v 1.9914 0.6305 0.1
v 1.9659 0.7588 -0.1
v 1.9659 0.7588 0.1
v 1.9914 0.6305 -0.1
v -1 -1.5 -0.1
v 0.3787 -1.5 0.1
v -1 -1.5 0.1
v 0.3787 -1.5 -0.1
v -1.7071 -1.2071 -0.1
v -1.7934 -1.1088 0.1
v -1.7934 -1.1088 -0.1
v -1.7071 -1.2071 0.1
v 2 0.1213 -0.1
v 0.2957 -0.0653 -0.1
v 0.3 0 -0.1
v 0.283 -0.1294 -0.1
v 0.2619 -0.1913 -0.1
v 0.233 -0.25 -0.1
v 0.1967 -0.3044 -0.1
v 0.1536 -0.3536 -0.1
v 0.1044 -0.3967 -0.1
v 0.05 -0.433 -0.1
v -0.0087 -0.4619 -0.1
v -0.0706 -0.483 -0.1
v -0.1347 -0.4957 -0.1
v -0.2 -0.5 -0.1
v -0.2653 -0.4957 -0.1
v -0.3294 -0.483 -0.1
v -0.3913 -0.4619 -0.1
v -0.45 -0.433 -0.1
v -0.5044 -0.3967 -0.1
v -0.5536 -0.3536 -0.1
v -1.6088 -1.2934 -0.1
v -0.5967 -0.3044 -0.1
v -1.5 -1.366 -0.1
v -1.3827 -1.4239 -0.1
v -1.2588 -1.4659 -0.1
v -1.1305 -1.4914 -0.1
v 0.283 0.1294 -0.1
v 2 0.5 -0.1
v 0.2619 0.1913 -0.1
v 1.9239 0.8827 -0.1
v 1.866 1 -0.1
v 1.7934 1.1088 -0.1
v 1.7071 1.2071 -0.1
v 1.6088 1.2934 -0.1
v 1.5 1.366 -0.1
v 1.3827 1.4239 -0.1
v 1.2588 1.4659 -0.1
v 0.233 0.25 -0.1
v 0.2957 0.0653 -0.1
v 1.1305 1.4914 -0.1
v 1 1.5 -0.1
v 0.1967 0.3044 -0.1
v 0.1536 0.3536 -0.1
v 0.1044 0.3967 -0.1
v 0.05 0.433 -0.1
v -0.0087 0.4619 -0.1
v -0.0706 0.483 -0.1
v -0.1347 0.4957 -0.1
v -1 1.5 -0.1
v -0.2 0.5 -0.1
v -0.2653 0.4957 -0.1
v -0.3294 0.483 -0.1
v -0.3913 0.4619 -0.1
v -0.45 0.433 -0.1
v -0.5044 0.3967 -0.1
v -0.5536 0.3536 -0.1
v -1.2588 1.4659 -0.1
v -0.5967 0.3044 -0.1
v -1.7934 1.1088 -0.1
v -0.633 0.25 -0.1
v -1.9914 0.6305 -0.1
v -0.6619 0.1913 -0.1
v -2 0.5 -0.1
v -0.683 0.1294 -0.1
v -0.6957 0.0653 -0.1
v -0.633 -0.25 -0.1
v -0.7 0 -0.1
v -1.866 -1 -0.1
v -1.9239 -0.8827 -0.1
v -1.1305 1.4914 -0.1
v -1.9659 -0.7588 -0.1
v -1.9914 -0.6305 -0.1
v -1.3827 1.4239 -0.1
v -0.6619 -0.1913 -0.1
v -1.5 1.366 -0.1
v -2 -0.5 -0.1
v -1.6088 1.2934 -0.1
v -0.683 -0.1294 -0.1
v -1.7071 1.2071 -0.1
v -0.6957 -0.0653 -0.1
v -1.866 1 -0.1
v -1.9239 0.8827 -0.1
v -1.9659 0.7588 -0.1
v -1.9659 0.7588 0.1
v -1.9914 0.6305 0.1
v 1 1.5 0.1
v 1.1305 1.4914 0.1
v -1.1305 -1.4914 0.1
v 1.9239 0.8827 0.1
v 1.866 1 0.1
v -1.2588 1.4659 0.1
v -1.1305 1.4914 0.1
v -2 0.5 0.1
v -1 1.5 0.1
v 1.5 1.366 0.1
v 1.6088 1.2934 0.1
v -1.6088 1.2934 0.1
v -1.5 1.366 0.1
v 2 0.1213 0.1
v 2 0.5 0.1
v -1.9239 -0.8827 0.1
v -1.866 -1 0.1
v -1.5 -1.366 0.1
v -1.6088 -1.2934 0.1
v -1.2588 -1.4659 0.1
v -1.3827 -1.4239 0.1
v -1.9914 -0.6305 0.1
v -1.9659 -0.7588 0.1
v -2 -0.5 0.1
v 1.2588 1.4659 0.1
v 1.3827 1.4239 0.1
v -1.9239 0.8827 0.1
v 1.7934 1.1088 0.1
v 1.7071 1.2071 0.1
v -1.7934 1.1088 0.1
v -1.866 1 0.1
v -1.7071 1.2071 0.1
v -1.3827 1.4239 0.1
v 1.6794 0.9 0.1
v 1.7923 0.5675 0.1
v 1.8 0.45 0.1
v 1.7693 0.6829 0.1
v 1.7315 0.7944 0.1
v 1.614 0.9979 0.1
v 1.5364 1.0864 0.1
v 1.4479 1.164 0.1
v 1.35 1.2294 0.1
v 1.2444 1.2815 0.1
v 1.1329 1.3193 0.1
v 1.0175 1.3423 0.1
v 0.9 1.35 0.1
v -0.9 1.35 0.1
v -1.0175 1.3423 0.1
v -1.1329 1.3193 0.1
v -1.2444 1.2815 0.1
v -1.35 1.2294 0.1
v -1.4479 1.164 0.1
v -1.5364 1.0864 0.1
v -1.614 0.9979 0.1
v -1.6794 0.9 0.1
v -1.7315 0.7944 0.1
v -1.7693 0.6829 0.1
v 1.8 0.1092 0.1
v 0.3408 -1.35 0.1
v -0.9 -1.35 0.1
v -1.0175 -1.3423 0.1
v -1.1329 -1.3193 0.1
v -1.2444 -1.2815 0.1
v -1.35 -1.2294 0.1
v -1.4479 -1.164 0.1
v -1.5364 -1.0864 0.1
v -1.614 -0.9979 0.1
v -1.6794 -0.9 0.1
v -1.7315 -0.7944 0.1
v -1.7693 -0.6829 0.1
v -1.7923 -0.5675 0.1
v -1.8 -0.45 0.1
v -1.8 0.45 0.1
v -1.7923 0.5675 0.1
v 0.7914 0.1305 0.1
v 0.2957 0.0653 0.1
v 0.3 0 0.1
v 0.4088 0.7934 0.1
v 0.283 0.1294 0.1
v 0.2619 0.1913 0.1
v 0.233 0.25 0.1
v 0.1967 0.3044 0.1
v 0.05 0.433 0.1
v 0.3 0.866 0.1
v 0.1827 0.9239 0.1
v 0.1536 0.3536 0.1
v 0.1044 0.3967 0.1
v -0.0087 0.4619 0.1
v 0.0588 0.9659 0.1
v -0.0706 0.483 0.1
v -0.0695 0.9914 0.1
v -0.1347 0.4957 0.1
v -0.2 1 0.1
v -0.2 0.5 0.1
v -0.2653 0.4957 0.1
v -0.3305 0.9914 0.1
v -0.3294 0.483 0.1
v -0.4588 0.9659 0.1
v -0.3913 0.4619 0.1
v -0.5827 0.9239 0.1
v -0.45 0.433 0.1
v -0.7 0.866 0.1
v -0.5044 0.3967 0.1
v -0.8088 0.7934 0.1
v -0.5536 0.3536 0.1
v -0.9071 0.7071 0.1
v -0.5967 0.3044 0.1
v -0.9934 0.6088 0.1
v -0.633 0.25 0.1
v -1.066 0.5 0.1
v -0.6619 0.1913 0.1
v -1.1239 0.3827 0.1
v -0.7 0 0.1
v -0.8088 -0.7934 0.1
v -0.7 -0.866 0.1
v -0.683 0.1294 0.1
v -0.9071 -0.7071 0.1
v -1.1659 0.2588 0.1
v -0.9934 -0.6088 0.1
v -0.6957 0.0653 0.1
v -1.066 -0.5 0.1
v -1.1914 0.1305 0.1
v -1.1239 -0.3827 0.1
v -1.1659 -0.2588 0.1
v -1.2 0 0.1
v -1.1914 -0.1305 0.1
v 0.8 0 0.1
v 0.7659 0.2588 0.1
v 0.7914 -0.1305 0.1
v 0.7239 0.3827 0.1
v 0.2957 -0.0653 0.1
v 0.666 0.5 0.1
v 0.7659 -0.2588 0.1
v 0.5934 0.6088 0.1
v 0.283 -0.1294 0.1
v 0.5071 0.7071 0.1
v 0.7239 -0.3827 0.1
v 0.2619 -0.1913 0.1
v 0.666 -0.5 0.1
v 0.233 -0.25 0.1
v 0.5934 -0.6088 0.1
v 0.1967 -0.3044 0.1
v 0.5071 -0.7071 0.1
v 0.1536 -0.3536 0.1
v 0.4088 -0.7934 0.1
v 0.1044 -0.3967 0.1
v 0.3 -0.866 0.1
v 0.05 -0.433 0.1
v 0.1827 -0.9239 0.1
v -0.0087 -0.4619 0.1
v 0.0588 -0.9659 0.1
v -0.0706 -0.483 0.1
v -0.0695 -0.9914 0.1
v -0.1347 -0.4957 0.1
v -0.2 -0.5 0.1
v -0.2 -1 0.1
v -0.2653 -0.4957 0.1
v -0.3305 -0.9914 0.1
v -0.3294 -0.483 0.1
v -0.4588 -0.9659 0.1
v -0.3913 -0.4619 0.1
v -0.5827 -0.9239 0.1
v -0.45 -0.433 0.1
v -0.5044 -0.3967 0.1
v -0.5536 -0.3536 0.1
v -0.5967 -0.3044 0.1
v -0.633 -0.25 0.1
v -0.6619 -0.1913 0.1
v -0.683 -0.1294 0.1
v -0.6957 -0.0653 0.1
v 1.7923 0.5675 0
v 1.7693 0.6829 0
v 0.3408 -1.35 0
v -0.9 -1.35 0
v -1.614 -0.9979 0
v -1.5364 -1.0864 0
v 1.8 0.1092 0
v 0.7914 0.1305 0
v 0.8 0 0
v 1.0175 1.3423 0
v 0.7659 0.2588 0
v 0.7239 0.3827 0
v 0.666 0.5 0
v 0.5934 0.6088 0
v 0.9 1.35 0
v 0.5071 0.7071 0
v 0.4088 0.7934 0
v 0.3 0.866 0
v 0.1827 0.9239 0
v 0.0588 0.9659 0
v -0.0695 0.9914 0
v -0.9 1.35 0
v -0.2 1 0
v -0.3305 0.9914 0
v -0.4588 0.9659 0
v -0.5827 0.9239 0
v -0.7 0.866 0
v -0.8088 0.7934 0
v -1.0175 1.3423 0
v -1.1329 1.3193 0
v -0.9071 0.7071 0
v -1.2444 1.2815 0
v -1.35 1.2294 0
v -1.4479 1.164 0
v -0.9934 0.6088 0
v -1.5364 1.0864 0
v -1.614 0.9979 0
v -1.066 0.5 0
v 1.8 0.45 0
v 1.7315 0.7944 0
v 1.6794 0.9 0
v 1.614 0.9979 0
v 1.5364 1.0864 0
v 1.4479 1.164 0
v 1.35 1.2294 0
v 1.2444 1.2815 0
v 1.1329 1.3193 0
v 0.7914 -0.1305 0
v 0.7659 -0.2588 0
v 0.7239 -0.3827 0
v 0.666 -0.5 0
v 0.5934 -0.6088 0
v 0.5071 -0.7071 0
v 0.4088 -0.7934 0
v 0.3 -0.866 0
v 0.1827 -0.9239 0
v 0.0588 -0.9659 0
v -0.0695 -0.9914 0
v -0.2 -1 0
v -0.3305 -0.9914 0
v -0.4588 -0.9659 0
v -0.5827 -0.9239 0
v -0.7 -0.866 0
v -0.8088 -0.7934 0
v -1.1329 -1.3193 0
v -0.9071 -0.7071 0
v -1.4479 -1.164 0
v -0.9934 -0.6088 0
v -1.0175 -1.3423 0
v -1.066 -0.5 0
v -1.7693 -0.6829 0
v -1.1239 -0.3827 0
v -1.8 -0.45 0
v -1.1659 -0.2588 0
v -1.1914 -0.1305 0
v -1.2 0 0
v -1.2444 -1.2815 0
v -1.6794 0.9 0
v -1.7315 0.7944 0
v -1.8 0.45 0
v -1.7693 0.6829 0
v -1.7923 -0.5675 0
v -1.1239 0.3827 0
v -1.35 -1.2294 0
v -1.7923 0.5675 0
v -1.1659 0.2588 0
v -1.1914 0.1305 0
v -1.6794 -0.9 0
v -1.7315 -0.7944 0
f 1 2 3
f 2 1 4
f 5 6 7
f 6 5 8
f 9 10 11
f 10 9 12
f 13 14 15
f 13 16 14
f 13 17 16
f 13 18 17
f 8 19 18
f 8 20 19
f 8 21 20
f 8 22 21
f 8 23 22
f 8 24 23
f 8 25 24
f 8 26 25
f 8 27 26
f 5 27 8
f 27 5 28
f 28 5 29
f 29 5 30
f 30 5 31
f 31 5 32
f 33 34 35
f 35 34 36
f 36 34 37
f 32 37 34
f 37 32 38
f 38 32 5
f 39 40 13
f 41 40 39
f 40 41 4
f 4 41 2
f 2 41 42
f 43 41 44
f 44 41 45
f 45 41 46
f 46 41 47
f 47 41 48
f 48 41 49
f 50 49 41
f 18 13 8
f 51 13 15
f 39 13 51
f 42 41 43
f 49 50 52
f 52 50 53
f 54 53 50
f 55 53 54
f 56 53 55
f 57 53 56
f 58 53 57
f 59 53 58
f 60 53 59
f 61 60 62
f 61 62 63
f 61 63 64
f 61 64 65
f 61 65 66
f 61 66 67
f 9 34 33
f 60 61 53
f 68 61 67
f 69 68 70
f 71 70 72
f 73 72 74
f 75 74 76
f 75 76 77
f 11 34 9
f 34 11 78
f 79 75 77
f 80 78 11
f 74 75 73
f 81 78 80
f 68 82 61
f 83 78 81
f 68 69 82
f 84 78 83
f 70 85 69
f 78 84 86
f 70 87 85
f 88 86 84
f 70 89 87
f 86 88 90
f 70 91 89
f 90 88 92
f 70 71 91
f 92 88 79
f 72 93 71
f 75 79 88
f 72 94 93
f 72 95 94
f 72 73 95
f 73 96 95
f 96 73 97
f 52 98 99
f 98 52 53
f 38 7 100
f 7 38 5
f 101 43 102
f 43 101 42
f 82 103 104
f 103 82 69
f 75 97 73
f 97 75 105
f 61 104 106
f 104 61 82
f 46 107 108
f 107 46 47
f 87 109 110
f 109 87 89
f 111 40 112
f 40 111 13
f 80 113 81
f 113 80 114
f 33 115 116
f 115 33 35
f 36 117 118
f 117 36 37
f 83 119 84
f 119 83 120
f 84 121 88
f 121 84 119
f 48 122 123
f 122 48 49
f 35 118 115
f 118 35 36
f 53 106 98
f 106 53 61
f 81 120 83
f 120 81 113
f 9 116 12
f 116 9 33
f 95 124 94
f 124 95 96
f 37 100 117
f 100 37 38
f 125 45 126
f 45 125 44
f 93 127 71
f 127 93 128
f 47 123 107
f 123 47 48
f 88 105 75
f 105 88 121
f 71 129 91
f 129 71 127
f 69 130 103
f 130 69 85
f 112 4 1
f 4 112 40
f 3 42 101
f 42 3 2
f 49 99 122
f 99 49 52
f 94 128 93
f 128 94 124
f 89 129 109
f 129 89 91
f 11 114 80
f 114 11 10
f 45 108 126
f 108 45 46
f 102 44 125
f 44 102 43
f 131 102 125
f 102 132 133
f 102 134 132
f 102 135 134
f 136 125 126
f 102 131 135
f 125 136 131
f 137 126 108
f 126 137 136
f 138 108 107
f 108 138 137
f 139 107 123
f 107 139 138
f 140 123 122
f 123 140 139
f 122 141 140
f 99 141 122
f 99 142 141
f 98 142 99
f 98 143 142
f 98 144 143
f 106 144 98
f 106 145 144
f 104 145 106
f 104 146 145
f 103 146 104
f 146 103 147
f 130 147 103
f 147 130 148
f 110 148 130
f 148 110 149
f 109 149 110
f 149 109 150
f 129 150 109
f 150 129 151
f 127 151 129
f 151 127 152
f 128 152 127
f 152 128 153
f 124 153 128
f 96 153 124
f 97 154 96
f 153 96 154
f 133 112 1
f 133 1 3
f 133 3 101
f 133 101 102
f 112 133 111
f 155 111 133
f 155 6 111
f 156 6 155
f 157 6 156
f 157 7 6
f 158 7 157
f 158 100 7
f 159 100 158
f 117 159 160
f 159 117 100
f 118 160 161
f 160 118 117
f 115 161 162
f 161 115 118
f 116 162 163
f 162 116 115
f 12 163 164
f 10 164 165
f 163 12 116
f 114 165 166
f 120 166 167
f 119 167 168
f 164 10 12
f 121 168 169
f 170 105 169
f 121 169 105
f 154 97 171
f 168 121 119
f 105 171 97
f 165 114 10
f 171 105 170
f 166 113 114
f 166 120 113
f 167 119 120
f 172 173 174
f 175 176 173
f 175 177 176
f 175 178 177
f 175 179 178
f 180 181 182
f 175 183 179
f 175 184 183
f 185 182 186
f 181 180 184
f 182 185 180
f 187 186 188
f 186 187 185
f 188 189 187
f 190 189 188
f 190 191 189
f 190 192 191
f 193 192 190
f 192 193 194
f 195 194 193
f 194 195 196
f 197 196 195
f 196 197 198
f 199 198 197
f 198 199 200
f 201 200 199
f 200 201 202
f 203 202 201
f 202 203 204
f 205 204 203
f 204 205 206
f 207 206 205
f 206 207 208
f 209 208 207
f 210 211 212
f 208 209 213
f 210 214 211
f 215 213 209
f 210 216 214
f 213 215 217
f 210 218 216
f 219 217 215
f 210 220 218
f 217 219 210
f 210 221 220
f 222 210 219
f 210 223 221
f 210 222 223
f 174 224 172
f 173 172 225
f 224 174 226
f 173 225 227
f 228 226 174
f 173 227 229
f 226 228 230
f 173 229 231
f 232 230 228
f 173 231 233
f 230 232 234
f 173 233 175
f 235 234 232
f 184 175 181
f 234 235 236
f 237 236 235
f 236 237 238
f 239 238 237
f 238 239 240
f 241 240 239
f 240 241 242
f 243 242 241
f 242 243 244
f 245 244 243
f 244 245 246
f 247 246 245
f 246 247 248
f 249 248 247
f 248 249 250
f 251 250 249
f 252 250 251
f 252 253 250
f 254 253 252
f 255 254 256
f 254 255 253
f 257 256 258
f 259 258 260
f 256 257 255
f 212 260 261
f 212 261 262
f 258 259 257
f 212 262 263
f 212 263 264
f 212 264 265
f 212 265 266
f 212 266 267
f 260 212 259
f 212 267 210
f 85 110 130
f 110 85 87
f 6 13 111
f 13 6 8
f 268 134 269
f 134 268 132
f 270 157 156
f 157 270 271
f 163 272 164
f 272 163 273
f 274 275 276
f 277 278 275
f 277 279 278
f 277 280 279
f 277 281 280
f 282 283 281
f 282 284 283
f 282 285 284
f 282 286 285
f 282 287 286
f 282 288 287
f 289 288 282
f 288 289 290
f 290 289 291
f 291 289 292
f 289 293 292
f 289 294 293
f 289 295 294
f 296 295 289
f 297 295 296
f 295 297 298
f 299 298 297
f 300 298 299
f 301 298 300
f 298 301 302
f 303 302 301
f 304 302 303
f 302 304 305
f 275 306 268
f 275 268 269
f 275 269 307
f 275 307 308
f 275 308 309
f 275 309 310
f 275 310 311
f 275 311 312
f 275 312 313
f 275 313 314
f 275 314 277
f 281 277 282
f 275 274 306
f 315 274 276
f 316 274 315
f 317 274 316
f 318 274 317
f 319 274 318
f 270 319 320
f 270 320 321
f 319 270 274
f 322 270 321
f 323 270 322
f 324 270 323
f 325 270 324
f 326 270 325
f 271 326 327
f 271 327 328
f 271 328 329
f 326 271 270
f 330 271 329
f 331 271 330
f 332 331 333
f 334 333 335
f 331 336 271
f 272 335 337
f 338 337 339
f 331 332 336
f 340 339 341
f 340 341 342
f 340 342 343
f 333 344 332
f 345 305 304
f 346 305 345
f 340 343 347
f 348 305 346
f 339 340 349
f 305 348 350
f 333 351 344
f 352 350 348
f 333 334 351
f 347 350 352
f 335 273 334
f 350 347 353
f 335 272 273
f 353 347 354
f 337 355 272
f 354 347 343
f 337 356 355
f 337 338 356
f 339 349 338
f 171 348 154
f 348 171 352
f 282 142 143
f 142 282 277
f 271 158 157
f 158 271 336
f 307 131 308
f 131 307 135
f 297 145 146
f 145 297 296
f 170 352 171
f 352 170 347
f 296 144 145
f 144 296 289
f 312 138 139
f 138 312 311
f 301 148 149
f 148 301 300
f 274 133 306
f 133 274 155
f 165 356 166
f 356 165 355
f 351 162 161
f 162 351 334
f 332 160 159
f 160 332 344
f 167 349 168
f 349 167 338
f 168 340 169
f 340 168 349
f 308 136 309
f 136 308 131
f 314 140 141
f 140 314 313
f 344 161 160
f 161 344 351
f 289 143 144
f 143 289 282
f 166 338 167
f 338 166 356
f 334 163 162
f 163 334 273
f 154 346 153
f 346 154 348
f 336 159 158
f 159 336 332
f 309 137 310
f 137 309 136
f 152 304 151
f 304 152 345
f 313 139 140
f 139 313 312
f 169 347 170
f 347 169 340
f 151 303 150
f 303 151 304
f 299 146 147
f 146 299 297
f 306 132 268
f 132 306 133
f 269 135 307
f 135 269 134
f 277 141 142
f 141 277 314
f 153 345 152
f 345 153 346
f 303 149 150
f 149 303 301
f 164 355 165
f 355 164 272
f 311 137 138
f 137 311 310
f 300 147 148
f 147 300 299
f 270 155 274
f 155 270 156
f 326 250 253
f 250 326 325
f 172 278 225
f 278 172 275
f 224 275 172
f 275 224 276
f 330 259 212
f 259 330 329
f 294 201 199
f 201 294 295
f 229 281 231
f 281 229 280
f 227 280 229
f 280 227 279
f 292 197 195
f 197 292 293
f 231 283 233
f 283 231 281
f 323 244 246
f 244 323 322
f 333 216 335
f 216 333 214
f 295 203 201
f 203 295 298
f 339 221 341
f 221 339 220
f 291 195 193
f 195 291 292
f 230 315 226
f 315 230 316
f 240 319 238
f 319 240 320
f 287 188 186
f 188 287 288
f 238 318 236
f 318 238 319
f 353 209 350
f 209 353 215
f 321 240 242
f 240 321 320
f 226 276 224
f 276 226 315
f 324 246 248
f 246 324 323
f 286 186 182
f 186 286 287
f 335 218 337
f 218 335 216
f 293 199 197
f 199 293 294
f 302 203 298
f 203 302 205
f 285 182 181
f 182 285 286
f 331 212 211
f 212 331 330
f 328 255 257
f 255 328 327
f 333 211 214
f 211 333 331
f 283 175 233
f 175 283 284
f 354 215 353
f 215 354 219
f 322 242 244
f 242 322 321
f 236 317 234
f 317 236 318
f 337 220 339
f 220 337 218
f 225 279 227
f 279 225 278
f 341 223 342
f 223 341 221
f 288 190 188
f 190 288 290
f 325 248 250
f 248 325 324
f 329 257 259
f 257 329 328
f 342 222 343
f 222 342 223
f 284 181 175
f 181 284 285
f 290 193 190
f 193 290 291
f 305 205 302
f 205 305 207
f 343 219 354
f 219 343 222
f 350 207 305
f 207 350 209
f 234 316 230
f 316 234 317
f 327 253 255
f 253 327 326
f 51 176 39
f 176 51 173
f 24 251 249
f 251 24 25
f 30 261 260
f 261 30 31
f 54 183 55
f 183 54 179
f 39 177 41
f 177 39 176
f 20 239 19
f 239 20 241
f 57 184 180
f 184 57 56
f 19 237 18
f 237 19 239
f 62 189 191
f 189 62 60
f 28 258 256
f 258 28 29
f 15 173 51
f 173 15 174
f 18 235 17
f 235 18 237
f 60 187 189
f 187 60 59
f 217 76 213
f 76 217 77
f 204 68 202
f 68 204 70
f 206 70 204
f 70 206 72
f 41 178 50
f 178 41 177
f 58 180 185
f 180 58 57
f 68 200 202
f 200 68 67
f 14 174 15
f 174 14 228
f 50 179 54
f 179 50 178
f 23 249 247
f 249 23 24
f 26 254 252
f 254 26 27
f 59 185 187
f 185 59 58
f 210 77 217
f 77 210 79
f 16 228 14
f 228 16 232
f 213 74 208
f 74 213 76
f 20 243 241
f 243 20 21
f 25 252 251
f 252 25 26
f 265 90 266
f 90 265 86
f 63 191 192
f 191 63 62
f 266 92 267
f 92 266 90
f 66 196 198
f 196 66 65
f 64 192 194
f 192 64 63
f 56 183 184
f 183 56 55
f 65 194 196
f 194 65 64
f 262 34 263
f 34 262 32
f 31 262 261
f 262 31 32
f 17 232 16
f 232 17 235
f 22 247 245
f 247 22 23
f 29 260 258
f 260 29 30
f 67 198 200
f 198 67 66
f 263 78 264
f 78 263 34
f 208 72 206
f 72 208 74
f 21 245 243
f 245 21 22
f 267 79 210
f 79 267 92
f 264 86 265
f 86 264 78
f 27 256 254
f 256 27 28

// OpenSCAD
// Generated by SolidPython 1.1.3 on 2024-01-14 21:36:44
$fn = 48;


union() {
	difference() {
		difference() {
			difference() {
				scale(v = [1, 1, 0.1000000000]) {
					minkowski() {
						cube(center = true, size = [2, 1, 1]);
						cylinder(center = true, h = 1, r = 1);
					}
				}
				translate(v = [2, -2, 0]) {
					rotate(a = [0, 0, 45]) {
						cube(center = true, size = 3);
					}
				}
			}
			difference() {
				translate(v = [0, 0, 0.1000000000]) {
					scale(v = [0.9000000000, 0.9000000000, 1.0000000000]) {
						difference() {
							scale(v = [1, 1, 0.1000000000]) {
								minkowski() {
									cube(center = true, size = [2, 1, 1]);
									cylinder(center = true, h = 1, r = 1);
								}
							}
							translate(v = [2, -2, 0]) {
								rotate(a = [0, 0, 45]) {
									cube(center = true, size = 3);
								}
							}
						}
					}
				}
				translate(v = [-0.2000000000, 0, 0]) {
					cylinder(center = true, h = 5, r = 1.0000000000);
				}
			}
		}
		translate(v = [-0.2000000000, 0, 0]) {
			cylinder(center = true, h = 5, r = 0.5000000000);
		}
	}
}
/***********************************************
*********      SolidPython code:      **********
************************************************
 
#! /usr/bin/env python3
import sys
import numpy as np
from solid import *
from solid.objects import cube, translate, union, rotate, color, cylinder

SEGMENTS = 48


def eyeGenerator():

    cubeShape = cube([2, 1, 1], center=True)
    cornerCylinder = cylinder(h=1, r=1, center=True)
    eyeCup = minkowski()(cubeShape, cornerCylinder)
    eyeCup = scale([1, 1, .1])(eyeCup)
    cubeShape = translate([2, -2, 0])(rotate([0, 0, 45])(cube(3, center=True)))
    eyeCup = difference()(eyeCup, cubeShape)

    scaledEyeCup = translate([0, 0, .1])(scale([.9, .9, 1.])(eyeCup))
    outerCorneaCylinder = translate([-.2, 0, 0])(cylinder(h=5, r=1., center=True))
    scaledEyeCup = difference()(scaledEyeCup, outerCorneaCylinder)
    eyeCup = difference()(eyeCup, scaledEyeCup)

    corneaCylinder = translate([-.2, 0, 0])(cylinder(h=5, r=.5, center=True))
    eyeCup = difference()(eyeCup, corneaCylinder)

    return union()(eyeCup)


if __name__ == '__main__':
    out_dir = sys.argv[1] if len(sys.argv) > 1 else None

    a = eyeGenerator()

    # Adding the file_header argument as shown allows you to change
    # the detail of arcs by changing the SEGMENTS variable.  This can
    # be expensive when making lots of small curves, but is otherwise
    # useful.
    file_out = scad_render_to_file(
        a, out_dir=out_dir, file_header=f'$fn = {SEGMENTS};')
    print(f"{__file__}: SCAD file written to: \n{file_out}")
 
 
************************************************/
